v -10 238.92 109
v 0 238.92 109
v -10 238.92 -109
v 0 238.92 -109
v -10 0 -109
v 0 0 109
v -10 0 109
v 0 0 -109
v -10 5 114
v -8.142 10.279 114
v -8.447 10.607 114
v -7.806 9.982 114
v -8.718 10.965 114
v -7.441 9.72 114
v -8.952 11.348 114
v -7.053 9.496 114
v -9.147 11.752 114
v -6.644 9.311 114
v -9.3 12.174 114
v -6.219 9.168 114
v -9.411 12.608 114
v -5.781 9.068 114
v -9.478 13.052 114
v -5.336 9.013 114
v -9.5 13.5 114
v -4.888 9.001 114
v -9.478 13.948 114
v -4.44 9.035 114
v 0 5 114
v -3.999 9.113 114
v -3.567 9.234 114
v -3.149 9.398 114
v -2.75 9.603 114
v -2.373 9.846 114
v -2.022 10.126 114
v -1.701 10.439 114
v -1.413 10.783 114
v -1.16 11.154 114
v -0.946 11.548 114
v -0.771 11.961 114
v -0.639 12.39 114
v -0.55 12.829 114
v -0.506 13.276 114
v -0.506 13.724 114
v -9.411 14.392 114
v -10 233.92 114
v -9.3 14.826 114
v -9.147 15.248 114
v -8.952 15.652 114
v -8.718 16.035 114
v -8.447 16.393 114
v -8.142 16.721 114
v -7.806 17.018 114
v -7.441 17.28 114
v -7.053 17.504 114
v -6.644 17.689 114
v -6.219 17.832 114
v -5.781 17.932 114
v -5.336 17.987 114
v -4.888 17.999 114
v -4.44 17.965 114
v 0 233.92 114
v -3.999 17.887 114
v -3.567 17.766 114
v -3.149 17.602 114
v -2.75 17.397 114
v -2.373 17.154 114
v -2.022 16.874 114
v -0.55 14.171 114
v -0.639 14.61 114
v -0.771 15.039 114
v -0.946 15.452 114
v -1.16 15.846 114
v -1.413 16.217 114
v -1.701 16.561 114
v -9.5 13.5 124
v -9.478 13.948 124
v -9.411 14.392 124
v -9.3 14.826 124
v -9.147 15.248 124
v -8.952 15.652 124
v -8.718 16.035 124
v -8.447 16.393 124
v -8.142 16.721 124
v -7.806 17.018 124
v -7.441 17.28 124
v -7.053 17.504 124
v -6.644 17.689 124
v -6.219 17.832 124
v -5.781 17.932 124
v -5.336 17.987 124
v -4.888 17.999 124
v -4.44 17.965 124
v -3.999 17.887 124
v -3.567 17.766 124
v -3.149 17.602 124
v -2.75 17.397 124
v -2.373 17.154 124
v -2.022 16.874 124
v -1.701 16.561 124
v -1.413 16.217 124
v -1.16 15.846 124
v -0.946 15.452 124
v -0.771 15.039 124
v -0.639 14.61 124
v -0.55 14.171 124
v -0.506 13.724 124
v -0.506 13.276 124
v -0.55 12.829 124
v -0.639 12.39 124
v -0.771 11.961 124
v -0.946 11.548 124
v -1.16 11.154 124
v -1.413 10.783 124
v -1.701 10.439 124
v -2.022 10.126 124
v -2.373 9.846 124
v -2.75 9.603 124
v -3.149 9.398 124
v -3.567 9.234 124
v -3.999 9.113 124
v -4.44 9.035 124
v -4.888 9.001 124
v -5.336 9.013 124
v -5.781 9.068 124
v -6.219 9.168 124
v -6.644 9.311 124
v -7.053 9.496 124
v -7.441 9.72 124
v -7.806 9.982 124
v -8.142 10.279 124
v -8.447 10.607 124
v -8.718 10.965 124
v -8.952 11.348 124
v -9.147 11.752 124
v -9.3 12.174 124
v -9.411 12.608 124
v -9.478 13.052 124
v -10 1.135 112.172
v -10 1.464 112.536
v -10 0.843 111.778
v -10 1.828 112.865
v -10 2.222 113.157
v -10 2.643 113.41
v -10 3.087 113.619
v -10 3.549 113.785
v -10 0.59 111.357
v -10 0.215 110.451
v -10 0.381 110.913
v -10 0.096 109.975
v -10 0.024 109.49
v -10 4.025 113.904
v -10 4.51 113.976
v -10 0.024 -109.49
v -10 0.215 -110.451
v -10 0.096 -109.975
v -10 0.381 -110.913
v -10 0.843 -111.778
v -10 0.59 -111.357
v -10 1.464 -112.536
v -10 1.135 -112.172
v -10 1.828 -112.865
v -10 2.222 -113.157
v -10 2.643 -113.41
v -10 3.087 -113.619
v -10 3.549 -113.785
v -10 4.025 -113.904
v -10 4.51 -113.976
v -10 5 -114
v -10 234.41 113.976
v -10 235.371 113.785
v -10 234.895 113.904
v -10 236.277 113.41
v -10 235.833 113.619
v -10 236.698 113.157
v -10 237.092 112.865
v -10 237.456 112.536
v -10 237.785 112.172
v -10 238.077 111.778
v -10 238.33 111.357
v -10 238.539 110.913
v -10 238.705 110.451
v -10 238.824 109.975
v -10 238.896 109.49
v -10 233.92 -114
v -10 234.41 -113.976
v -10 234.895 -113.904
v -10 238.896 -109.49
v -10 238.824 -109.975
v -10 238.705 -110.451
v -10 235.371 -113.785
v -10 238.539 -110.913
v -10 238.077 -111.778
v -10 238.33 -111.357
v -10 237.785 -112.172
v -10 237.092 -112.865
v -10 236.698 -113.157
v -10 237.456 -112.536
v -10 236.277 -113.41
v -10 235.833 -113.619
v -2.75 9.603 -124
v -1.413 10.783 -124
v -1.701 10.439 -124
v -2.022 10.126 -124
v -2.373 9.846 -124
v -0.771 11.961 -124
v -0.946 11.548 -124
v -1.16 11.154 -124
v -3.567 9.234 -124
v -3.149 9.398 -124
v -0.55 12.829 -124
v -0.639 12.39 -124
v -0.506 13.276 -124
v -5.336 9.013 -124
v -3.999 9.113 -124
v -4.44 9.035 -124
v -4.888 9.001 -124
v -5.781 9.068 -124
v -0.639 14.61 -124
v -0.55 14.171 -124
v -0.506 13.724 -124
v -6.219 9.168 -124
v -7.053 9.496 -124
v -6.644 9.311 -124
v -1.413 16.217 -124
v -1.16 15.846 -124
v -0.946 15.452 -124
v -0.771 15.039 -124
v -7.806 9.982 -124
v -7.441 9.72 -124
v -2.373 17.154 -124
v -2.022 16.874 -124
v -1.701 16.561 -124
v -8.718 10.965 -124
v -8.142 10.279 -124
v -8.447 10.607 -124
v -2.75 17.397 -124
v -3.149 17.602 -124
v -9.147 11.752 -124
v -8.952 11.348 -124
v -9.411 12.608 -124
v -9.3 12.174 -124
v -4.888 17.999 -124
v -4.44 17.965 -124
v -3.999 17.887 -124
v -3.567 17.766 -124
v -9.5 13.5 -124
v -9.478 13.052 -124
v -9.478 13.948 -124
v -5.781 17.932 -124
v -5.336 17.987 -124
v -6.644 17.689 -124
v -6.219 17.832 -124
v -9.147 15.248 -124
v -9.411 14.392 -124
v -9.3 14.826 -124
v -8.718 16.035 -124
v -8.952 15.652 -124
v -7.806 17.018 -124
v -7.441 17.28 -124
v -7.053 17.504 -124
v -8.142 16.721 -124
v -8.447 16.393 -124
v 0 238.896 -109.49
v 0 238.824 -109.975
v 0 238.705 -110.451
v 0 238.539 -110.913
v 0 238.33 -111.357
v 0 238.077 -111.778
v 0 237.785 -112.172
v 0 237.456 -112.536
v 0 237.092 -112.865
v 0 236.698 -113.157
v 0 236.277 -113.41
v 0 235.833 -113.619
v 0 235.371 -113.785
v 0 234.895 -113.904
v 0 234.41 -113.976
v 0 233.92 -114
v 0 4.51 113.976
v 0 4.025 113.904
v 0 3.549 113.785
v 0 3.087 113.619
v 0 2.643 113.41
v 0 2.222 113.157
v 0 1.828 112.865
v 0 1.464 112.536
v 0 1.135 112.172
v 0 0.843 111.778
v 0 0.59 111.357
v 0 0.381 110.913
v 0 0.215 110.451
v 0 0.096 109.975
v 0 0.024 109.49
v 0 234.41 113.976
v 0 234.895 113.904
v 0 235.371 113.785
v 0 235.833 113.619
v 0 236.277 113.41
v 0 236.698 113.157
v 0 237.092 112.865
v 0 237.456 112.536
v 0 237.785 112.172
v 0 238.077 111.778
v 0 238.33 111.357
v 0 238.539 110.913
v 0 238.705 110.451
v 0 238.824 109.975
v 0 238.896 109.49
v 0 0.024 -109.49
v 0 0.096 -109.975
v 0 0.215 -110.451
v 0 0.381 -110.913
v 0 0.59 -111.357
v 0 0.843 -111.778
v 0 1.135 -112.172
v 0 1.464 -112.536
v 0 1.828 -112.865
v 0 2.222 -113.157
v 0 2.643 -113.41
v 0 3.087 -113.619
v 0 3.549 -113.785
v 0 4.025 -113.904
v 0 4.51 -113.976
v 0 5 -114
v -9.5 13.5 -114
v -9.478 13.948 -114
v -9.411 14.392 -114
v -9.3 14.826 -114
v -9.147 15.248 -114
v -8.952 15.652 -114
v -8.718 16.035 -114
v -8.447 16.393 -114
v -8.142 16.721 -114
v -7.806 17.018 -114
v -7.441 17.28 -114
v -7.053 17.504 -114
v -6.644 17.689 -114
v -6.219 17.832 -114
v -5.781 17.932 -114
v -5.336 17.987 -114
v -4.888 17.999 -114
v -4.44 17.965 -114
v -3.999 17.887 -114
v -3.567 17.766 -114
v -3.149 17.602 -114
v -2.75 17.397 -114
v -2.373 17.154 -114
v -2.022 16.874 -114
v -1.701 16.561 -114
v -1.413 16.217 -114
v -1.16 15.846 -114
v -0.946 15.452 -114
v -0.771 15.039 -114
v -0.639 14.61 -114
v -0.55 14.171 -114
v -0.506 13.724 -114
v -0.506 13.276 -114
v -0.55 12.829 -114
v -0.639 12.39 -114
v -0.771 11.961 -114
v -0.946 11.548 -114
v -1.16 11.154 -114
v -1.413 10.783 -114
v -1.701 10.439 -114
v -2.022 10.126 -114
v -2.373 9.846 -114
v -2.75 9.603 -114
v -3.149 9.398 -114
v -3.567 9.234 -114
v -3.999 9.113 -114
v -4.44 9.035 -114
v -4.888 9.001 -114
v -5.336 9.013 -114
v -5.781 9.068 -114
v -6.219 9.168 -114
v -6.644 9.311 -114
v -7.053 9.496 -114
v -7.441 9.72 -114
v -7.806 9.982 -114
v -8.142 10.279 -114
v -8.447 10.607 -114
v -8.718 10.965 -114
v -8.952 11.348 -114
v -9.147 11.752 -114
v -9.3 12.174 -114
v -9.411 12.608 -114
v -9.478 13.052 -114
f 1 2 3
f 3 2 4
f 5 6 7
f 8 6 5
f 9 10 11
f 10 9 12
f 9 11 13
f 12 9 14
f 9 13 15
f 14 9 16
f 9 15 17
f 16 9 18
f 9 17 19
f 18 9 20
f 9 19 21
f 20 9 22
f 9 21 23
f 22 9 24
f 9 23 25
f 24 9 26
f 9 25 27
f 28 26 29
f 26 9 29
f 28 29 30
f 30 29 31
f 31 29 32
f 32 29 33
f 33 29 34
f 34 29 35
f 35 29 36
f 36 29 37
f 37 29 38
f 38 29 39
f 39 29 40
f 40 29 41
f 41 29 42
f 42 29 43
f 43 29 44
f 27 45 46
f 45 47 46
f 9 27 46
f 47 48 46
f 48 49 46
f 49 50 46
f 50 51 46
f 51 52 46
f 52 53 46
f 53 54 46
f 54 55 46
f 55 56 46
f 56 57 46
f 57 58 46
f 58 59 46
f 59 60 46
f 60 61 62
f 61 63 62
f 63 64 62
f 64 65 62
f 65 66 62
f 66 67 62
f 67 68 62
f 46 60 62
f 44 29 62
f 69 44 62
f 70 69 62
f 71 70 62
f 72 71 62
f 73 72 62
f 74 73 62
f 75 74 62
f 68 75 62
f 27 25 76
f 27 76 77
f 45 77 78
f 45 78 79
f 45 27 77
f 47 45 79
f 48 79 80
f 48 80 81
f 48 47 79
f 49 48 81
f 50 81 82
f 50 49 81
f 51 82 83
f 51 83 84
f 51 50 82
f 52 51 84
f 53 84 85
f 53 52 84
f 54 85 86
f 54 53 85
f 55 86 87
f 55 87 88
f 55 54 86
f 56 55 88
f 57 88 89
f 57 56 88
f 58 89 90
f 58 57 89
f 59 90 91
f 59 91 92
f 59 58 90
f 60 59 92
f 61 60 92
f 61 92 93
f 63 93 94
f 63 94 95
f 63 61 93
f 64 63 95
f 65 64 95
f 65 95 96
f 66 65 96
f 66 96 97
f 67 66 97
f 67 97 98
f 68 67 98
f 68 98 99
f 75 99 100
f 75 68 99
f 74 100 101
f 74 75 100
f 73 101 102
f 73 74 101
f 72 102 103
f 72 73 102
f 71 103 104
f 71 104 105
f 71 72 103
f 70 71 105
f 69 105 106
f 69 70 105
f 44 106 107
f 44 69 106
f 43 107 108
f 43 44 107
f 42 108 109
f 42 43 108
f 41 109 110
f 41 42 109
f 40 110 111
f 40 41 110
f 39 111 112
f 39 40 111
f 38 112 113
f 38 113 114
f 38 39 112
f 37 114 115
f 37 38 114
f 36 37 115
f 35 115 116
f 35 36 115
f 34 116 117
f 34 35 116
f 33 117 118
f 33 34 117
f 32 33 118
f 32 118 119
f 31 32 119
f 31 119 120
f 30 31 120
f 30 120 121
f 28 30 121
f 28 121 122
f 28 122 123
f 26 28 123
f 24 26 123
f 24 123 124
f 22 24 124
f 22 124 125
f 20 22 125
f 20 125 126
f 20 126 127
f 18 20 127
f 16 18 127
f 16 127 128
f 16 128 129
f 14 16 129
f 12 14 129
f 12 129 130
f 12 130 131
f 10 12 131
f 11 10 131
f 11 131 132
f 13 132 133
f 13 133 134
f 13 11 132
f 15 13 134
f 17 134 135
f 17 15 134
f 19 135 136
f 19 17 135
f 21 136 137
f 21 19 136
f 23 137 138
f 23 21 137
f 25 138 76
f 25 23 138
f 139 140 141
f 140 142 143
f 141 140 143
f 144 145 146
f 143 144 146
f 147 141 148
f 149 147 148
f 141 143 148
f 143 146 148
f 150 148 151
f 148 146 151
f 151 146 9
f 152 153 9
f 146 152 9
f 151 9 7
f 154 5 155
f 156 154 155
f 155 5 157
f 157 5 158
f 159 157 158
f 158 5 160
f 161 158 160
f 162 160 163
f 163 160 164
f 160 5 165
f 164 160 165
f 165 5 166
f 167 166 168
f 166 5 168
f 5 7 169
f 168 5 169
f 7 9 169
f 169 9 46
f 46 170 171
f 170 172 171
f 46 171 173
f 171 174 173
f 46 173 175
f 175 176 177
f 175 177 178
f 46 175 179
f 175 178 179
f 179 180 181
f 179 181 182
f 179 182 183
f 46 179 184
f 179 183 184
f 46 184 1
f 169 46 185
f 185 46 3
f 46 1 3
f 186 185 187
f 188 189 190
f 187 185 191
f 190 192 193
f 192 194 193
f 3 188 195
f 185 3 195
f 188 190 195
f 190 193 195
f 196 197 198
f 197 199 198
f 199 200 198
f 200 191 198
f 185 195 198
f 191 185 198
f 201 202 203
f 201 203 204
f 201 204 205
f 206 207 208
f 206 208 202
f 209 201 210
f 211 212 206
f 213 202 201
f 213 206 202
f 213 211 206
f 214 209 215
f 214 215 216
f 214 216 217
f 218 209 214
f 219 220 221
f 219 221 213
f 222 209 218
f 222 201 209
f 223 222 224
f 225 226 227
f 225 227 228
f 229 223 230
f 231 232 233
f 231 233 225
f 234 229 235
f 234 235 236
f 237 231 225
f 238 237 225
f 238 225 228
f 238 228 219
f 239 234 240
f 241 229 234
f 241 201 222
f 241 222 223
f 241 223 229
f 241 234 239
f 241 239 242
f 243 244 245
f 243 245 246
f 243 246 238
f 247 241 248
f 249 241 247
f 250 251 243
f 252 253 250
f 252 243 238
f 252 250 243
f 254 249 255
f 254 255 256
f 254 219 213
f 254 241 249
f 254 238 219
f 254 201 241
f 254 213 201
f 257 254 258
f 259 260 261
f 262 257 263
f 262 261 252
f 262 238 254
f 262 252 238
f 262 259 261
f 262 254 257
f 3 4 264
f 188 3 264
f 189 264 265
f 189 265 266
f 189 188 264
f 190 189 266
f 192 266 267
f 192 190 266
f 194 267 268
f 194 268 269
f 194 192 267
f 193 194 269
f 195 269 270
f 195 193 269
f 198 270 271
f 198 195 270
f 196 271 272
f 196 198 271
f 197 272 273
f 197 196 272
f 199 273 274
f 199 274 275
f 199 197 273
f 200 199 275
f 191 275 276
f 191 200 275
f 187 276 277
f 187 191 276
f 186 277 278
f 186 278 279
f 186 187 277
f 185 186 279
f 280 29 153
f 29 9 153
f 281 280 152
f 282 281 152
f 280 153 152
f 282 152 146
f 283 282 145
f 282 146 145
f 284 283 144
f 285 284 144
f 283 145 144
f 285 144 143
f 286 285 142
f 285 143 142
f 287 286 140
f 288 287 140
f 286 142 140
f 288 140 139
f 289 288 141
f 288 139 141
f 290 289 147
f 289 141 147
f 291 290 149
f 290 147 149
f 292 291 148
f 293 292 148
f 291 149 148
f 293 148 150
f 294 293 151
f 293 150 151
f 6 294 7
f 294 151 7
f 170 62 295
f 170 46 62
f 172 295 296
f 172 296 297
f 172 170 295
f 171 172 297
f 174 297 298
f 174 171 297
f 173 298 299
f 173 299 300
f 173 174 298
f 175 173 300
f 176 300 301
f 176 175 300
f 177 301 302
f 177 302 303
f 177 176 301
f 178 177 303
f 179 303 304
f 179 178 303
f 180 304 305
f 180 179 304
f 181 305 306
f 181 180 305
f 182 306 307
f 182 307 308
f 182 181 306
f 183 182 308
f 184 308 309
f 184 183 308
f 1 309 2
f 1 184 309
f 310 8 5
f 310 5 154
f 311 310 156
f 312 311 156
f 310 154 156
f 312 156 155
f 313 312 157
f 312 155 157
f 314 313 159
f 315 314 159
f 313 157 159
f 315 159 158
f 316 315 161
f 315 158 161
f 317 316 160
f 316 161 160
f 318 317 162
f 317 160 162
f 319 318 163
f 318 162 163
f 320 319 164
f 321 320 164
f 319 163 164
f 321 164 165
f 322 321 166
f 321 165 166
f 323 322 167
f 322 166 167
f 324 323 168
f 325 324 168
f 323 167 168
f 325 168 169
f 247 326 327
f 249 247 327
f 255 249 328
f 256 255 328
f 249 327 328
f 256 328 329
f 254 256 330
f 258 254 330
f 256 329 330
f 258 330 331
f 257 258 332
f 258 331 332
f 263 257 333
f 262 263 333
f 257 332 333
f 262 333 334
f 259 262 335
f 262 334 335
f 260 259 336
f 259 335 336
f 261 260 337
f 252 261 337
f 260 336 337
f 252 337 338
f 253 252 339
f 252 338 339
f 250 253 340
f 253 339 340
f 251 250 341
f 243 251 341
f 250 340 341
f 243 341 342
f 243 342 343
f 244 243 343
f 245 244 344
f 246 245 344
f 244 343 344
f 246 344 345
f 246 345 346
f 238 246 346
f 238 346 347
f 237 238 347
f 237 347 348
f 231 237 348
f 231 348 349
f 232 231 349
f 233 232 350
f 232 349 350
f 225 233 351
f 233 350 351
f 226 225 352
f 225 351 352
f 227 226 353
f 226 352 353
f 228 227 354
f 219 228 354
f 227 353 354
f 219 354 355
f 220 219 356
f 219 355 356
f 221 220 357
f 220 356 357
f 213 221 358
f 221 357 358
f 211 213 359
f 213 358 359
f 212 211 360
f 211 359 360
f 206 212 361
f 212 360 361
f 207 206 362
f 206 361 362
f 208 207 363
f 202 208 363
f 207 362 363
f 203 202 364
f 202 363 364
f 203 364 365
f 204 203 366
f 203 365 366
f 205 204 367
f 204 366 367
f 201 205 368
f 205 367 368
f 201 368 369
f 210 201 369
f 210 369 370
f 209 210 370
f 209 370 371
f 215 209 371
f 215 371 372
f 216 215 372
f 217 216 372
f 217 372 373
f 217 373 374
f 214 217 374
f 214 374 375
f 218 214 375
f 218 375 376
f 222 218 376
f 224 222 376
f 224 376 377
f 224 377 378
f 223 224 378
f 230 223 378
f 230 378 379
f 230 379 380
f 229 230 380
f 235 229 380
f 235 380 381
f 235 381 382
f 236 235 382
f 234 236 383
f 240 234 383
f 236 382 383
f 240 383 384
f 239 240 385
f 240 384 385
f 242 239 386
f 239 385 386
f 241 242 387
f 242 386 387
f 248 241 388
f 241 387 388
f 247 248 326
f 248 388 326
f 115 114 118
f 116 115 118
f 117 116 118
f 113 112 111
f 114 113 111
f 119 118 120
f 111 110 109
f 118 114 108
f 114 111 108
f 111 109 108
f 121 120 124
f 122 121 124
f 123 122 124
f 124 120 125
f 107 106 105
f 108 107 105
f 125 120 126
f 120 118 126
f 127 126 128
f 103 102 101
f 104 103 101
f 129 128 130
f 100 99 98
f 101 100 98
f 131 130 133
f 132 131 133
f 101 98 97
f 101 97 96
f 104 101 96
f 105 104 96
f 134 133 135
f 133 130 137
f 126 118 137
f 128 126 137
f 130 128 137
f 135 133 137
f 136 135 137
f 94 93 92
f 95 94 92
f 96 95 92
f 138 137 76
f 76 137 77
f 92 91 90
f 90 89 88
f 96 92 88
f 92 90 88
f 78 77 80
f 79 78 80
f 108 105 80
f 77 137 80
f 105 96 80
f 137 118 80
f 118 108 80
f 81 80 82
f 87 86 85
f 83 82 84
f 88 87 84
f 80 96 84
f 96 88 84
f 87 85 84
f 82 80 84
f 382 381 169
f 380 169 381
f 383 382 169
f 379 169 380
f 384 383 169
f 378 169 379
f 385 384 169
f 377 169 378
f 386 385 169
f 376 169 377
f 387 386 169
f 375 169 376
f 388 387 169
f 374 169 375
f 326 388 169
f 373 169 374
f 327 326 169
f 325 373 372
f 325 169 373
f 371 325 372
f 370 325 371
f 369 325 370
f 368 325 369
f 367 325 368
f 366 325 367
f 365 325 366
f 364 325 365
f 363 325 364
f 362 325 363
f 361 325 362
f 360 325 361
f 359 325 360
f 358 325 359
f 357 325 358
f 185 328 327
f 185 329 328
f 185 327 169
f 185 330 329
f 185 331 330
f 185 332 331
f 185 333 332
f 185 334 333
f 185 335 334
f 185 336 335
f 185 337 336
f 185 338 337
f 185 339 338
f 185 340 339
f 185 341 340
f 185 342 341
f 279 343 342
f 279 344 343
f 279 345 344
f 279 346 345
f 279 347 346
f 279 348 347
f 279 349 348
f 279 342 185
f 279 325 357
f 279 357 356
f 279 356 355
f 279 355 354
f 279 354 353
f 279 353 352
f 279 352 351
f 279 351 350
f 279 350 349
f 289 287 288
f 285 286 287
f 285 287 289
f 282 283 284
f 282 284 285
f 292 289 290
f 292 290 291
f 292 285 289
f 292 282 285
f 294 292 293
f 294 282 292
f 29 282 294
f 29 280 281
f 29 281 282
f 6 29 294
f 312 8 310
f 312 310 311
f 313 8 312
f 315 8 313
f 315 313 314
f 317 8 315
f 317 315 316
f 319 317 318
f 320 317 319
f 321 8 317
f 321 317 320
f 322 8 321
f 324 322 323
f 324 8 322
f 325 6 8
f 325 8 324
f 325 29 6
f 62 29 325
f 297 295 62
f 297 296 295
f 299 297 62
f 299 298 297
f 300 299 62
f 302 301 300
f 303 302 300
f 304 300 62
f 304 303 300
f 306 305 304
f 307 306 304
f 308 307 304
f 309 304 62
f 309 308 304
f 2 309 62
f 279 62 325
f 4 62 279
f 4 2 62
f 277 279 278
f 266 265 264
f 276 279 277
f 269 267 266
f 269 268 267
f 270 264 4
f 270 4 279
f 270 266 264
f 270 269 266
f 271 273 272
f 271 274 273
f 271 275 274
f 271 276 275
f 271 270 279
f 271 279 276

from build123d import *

# Parameters (mm, degrees)
SKETCH1_W           = 228
SKETCH1_H           = 238.91999995
BOSS_EXTRUDE1_DEPTH = 10
SKETCH2_R           = 4.5
BOSS_EXTRUDE2_DEPTH = 10
FILLET1_R           = 5


with BuildPart() as part:
    # Sketch1 → Boss-Extrude1 (new body)
    with BuildSketch(Plane(origin=(0, 0, 0), x_dir=(0, 0, -1), z_dir=(1, 0, 0))):
        with Locations((0, 119.459999975)):
            Rectangle(SKETCH1_W, SKETCH1_H)
    extrude(amount=-BOSS_EXTRUDE1_DEPTH)

    # Sketch2 → Boss-Extrude2 (add)
    with BuildSketch(Plane(origin=(0, 0, -114), x_dir=(-1, 0, 0), z_dir=(0, 0, -1))):
        with Locations((5, 13.5)):
            Circle(SKETCH2_R)
    boss_extrude2 = extrude(amount=BOSS_EXTRUDE2_DEPTH)

    # Mirror1: Boss-Extrude2 across plane
    add(boss_extrude2.mirror(Plane.XY))

    # Fillet1
    fillet1_edges = [part.edges().sort_by_distance(p)[0] for p in [
        (-5, 238.91999995, 114),
        (-5, 238.91999995, -114),
        (-5, 0, -114),
        (-5, 0, 114),
    ]]
    fillet(fillet1_edges, radius=FILLET1_R)


solid = part.part
